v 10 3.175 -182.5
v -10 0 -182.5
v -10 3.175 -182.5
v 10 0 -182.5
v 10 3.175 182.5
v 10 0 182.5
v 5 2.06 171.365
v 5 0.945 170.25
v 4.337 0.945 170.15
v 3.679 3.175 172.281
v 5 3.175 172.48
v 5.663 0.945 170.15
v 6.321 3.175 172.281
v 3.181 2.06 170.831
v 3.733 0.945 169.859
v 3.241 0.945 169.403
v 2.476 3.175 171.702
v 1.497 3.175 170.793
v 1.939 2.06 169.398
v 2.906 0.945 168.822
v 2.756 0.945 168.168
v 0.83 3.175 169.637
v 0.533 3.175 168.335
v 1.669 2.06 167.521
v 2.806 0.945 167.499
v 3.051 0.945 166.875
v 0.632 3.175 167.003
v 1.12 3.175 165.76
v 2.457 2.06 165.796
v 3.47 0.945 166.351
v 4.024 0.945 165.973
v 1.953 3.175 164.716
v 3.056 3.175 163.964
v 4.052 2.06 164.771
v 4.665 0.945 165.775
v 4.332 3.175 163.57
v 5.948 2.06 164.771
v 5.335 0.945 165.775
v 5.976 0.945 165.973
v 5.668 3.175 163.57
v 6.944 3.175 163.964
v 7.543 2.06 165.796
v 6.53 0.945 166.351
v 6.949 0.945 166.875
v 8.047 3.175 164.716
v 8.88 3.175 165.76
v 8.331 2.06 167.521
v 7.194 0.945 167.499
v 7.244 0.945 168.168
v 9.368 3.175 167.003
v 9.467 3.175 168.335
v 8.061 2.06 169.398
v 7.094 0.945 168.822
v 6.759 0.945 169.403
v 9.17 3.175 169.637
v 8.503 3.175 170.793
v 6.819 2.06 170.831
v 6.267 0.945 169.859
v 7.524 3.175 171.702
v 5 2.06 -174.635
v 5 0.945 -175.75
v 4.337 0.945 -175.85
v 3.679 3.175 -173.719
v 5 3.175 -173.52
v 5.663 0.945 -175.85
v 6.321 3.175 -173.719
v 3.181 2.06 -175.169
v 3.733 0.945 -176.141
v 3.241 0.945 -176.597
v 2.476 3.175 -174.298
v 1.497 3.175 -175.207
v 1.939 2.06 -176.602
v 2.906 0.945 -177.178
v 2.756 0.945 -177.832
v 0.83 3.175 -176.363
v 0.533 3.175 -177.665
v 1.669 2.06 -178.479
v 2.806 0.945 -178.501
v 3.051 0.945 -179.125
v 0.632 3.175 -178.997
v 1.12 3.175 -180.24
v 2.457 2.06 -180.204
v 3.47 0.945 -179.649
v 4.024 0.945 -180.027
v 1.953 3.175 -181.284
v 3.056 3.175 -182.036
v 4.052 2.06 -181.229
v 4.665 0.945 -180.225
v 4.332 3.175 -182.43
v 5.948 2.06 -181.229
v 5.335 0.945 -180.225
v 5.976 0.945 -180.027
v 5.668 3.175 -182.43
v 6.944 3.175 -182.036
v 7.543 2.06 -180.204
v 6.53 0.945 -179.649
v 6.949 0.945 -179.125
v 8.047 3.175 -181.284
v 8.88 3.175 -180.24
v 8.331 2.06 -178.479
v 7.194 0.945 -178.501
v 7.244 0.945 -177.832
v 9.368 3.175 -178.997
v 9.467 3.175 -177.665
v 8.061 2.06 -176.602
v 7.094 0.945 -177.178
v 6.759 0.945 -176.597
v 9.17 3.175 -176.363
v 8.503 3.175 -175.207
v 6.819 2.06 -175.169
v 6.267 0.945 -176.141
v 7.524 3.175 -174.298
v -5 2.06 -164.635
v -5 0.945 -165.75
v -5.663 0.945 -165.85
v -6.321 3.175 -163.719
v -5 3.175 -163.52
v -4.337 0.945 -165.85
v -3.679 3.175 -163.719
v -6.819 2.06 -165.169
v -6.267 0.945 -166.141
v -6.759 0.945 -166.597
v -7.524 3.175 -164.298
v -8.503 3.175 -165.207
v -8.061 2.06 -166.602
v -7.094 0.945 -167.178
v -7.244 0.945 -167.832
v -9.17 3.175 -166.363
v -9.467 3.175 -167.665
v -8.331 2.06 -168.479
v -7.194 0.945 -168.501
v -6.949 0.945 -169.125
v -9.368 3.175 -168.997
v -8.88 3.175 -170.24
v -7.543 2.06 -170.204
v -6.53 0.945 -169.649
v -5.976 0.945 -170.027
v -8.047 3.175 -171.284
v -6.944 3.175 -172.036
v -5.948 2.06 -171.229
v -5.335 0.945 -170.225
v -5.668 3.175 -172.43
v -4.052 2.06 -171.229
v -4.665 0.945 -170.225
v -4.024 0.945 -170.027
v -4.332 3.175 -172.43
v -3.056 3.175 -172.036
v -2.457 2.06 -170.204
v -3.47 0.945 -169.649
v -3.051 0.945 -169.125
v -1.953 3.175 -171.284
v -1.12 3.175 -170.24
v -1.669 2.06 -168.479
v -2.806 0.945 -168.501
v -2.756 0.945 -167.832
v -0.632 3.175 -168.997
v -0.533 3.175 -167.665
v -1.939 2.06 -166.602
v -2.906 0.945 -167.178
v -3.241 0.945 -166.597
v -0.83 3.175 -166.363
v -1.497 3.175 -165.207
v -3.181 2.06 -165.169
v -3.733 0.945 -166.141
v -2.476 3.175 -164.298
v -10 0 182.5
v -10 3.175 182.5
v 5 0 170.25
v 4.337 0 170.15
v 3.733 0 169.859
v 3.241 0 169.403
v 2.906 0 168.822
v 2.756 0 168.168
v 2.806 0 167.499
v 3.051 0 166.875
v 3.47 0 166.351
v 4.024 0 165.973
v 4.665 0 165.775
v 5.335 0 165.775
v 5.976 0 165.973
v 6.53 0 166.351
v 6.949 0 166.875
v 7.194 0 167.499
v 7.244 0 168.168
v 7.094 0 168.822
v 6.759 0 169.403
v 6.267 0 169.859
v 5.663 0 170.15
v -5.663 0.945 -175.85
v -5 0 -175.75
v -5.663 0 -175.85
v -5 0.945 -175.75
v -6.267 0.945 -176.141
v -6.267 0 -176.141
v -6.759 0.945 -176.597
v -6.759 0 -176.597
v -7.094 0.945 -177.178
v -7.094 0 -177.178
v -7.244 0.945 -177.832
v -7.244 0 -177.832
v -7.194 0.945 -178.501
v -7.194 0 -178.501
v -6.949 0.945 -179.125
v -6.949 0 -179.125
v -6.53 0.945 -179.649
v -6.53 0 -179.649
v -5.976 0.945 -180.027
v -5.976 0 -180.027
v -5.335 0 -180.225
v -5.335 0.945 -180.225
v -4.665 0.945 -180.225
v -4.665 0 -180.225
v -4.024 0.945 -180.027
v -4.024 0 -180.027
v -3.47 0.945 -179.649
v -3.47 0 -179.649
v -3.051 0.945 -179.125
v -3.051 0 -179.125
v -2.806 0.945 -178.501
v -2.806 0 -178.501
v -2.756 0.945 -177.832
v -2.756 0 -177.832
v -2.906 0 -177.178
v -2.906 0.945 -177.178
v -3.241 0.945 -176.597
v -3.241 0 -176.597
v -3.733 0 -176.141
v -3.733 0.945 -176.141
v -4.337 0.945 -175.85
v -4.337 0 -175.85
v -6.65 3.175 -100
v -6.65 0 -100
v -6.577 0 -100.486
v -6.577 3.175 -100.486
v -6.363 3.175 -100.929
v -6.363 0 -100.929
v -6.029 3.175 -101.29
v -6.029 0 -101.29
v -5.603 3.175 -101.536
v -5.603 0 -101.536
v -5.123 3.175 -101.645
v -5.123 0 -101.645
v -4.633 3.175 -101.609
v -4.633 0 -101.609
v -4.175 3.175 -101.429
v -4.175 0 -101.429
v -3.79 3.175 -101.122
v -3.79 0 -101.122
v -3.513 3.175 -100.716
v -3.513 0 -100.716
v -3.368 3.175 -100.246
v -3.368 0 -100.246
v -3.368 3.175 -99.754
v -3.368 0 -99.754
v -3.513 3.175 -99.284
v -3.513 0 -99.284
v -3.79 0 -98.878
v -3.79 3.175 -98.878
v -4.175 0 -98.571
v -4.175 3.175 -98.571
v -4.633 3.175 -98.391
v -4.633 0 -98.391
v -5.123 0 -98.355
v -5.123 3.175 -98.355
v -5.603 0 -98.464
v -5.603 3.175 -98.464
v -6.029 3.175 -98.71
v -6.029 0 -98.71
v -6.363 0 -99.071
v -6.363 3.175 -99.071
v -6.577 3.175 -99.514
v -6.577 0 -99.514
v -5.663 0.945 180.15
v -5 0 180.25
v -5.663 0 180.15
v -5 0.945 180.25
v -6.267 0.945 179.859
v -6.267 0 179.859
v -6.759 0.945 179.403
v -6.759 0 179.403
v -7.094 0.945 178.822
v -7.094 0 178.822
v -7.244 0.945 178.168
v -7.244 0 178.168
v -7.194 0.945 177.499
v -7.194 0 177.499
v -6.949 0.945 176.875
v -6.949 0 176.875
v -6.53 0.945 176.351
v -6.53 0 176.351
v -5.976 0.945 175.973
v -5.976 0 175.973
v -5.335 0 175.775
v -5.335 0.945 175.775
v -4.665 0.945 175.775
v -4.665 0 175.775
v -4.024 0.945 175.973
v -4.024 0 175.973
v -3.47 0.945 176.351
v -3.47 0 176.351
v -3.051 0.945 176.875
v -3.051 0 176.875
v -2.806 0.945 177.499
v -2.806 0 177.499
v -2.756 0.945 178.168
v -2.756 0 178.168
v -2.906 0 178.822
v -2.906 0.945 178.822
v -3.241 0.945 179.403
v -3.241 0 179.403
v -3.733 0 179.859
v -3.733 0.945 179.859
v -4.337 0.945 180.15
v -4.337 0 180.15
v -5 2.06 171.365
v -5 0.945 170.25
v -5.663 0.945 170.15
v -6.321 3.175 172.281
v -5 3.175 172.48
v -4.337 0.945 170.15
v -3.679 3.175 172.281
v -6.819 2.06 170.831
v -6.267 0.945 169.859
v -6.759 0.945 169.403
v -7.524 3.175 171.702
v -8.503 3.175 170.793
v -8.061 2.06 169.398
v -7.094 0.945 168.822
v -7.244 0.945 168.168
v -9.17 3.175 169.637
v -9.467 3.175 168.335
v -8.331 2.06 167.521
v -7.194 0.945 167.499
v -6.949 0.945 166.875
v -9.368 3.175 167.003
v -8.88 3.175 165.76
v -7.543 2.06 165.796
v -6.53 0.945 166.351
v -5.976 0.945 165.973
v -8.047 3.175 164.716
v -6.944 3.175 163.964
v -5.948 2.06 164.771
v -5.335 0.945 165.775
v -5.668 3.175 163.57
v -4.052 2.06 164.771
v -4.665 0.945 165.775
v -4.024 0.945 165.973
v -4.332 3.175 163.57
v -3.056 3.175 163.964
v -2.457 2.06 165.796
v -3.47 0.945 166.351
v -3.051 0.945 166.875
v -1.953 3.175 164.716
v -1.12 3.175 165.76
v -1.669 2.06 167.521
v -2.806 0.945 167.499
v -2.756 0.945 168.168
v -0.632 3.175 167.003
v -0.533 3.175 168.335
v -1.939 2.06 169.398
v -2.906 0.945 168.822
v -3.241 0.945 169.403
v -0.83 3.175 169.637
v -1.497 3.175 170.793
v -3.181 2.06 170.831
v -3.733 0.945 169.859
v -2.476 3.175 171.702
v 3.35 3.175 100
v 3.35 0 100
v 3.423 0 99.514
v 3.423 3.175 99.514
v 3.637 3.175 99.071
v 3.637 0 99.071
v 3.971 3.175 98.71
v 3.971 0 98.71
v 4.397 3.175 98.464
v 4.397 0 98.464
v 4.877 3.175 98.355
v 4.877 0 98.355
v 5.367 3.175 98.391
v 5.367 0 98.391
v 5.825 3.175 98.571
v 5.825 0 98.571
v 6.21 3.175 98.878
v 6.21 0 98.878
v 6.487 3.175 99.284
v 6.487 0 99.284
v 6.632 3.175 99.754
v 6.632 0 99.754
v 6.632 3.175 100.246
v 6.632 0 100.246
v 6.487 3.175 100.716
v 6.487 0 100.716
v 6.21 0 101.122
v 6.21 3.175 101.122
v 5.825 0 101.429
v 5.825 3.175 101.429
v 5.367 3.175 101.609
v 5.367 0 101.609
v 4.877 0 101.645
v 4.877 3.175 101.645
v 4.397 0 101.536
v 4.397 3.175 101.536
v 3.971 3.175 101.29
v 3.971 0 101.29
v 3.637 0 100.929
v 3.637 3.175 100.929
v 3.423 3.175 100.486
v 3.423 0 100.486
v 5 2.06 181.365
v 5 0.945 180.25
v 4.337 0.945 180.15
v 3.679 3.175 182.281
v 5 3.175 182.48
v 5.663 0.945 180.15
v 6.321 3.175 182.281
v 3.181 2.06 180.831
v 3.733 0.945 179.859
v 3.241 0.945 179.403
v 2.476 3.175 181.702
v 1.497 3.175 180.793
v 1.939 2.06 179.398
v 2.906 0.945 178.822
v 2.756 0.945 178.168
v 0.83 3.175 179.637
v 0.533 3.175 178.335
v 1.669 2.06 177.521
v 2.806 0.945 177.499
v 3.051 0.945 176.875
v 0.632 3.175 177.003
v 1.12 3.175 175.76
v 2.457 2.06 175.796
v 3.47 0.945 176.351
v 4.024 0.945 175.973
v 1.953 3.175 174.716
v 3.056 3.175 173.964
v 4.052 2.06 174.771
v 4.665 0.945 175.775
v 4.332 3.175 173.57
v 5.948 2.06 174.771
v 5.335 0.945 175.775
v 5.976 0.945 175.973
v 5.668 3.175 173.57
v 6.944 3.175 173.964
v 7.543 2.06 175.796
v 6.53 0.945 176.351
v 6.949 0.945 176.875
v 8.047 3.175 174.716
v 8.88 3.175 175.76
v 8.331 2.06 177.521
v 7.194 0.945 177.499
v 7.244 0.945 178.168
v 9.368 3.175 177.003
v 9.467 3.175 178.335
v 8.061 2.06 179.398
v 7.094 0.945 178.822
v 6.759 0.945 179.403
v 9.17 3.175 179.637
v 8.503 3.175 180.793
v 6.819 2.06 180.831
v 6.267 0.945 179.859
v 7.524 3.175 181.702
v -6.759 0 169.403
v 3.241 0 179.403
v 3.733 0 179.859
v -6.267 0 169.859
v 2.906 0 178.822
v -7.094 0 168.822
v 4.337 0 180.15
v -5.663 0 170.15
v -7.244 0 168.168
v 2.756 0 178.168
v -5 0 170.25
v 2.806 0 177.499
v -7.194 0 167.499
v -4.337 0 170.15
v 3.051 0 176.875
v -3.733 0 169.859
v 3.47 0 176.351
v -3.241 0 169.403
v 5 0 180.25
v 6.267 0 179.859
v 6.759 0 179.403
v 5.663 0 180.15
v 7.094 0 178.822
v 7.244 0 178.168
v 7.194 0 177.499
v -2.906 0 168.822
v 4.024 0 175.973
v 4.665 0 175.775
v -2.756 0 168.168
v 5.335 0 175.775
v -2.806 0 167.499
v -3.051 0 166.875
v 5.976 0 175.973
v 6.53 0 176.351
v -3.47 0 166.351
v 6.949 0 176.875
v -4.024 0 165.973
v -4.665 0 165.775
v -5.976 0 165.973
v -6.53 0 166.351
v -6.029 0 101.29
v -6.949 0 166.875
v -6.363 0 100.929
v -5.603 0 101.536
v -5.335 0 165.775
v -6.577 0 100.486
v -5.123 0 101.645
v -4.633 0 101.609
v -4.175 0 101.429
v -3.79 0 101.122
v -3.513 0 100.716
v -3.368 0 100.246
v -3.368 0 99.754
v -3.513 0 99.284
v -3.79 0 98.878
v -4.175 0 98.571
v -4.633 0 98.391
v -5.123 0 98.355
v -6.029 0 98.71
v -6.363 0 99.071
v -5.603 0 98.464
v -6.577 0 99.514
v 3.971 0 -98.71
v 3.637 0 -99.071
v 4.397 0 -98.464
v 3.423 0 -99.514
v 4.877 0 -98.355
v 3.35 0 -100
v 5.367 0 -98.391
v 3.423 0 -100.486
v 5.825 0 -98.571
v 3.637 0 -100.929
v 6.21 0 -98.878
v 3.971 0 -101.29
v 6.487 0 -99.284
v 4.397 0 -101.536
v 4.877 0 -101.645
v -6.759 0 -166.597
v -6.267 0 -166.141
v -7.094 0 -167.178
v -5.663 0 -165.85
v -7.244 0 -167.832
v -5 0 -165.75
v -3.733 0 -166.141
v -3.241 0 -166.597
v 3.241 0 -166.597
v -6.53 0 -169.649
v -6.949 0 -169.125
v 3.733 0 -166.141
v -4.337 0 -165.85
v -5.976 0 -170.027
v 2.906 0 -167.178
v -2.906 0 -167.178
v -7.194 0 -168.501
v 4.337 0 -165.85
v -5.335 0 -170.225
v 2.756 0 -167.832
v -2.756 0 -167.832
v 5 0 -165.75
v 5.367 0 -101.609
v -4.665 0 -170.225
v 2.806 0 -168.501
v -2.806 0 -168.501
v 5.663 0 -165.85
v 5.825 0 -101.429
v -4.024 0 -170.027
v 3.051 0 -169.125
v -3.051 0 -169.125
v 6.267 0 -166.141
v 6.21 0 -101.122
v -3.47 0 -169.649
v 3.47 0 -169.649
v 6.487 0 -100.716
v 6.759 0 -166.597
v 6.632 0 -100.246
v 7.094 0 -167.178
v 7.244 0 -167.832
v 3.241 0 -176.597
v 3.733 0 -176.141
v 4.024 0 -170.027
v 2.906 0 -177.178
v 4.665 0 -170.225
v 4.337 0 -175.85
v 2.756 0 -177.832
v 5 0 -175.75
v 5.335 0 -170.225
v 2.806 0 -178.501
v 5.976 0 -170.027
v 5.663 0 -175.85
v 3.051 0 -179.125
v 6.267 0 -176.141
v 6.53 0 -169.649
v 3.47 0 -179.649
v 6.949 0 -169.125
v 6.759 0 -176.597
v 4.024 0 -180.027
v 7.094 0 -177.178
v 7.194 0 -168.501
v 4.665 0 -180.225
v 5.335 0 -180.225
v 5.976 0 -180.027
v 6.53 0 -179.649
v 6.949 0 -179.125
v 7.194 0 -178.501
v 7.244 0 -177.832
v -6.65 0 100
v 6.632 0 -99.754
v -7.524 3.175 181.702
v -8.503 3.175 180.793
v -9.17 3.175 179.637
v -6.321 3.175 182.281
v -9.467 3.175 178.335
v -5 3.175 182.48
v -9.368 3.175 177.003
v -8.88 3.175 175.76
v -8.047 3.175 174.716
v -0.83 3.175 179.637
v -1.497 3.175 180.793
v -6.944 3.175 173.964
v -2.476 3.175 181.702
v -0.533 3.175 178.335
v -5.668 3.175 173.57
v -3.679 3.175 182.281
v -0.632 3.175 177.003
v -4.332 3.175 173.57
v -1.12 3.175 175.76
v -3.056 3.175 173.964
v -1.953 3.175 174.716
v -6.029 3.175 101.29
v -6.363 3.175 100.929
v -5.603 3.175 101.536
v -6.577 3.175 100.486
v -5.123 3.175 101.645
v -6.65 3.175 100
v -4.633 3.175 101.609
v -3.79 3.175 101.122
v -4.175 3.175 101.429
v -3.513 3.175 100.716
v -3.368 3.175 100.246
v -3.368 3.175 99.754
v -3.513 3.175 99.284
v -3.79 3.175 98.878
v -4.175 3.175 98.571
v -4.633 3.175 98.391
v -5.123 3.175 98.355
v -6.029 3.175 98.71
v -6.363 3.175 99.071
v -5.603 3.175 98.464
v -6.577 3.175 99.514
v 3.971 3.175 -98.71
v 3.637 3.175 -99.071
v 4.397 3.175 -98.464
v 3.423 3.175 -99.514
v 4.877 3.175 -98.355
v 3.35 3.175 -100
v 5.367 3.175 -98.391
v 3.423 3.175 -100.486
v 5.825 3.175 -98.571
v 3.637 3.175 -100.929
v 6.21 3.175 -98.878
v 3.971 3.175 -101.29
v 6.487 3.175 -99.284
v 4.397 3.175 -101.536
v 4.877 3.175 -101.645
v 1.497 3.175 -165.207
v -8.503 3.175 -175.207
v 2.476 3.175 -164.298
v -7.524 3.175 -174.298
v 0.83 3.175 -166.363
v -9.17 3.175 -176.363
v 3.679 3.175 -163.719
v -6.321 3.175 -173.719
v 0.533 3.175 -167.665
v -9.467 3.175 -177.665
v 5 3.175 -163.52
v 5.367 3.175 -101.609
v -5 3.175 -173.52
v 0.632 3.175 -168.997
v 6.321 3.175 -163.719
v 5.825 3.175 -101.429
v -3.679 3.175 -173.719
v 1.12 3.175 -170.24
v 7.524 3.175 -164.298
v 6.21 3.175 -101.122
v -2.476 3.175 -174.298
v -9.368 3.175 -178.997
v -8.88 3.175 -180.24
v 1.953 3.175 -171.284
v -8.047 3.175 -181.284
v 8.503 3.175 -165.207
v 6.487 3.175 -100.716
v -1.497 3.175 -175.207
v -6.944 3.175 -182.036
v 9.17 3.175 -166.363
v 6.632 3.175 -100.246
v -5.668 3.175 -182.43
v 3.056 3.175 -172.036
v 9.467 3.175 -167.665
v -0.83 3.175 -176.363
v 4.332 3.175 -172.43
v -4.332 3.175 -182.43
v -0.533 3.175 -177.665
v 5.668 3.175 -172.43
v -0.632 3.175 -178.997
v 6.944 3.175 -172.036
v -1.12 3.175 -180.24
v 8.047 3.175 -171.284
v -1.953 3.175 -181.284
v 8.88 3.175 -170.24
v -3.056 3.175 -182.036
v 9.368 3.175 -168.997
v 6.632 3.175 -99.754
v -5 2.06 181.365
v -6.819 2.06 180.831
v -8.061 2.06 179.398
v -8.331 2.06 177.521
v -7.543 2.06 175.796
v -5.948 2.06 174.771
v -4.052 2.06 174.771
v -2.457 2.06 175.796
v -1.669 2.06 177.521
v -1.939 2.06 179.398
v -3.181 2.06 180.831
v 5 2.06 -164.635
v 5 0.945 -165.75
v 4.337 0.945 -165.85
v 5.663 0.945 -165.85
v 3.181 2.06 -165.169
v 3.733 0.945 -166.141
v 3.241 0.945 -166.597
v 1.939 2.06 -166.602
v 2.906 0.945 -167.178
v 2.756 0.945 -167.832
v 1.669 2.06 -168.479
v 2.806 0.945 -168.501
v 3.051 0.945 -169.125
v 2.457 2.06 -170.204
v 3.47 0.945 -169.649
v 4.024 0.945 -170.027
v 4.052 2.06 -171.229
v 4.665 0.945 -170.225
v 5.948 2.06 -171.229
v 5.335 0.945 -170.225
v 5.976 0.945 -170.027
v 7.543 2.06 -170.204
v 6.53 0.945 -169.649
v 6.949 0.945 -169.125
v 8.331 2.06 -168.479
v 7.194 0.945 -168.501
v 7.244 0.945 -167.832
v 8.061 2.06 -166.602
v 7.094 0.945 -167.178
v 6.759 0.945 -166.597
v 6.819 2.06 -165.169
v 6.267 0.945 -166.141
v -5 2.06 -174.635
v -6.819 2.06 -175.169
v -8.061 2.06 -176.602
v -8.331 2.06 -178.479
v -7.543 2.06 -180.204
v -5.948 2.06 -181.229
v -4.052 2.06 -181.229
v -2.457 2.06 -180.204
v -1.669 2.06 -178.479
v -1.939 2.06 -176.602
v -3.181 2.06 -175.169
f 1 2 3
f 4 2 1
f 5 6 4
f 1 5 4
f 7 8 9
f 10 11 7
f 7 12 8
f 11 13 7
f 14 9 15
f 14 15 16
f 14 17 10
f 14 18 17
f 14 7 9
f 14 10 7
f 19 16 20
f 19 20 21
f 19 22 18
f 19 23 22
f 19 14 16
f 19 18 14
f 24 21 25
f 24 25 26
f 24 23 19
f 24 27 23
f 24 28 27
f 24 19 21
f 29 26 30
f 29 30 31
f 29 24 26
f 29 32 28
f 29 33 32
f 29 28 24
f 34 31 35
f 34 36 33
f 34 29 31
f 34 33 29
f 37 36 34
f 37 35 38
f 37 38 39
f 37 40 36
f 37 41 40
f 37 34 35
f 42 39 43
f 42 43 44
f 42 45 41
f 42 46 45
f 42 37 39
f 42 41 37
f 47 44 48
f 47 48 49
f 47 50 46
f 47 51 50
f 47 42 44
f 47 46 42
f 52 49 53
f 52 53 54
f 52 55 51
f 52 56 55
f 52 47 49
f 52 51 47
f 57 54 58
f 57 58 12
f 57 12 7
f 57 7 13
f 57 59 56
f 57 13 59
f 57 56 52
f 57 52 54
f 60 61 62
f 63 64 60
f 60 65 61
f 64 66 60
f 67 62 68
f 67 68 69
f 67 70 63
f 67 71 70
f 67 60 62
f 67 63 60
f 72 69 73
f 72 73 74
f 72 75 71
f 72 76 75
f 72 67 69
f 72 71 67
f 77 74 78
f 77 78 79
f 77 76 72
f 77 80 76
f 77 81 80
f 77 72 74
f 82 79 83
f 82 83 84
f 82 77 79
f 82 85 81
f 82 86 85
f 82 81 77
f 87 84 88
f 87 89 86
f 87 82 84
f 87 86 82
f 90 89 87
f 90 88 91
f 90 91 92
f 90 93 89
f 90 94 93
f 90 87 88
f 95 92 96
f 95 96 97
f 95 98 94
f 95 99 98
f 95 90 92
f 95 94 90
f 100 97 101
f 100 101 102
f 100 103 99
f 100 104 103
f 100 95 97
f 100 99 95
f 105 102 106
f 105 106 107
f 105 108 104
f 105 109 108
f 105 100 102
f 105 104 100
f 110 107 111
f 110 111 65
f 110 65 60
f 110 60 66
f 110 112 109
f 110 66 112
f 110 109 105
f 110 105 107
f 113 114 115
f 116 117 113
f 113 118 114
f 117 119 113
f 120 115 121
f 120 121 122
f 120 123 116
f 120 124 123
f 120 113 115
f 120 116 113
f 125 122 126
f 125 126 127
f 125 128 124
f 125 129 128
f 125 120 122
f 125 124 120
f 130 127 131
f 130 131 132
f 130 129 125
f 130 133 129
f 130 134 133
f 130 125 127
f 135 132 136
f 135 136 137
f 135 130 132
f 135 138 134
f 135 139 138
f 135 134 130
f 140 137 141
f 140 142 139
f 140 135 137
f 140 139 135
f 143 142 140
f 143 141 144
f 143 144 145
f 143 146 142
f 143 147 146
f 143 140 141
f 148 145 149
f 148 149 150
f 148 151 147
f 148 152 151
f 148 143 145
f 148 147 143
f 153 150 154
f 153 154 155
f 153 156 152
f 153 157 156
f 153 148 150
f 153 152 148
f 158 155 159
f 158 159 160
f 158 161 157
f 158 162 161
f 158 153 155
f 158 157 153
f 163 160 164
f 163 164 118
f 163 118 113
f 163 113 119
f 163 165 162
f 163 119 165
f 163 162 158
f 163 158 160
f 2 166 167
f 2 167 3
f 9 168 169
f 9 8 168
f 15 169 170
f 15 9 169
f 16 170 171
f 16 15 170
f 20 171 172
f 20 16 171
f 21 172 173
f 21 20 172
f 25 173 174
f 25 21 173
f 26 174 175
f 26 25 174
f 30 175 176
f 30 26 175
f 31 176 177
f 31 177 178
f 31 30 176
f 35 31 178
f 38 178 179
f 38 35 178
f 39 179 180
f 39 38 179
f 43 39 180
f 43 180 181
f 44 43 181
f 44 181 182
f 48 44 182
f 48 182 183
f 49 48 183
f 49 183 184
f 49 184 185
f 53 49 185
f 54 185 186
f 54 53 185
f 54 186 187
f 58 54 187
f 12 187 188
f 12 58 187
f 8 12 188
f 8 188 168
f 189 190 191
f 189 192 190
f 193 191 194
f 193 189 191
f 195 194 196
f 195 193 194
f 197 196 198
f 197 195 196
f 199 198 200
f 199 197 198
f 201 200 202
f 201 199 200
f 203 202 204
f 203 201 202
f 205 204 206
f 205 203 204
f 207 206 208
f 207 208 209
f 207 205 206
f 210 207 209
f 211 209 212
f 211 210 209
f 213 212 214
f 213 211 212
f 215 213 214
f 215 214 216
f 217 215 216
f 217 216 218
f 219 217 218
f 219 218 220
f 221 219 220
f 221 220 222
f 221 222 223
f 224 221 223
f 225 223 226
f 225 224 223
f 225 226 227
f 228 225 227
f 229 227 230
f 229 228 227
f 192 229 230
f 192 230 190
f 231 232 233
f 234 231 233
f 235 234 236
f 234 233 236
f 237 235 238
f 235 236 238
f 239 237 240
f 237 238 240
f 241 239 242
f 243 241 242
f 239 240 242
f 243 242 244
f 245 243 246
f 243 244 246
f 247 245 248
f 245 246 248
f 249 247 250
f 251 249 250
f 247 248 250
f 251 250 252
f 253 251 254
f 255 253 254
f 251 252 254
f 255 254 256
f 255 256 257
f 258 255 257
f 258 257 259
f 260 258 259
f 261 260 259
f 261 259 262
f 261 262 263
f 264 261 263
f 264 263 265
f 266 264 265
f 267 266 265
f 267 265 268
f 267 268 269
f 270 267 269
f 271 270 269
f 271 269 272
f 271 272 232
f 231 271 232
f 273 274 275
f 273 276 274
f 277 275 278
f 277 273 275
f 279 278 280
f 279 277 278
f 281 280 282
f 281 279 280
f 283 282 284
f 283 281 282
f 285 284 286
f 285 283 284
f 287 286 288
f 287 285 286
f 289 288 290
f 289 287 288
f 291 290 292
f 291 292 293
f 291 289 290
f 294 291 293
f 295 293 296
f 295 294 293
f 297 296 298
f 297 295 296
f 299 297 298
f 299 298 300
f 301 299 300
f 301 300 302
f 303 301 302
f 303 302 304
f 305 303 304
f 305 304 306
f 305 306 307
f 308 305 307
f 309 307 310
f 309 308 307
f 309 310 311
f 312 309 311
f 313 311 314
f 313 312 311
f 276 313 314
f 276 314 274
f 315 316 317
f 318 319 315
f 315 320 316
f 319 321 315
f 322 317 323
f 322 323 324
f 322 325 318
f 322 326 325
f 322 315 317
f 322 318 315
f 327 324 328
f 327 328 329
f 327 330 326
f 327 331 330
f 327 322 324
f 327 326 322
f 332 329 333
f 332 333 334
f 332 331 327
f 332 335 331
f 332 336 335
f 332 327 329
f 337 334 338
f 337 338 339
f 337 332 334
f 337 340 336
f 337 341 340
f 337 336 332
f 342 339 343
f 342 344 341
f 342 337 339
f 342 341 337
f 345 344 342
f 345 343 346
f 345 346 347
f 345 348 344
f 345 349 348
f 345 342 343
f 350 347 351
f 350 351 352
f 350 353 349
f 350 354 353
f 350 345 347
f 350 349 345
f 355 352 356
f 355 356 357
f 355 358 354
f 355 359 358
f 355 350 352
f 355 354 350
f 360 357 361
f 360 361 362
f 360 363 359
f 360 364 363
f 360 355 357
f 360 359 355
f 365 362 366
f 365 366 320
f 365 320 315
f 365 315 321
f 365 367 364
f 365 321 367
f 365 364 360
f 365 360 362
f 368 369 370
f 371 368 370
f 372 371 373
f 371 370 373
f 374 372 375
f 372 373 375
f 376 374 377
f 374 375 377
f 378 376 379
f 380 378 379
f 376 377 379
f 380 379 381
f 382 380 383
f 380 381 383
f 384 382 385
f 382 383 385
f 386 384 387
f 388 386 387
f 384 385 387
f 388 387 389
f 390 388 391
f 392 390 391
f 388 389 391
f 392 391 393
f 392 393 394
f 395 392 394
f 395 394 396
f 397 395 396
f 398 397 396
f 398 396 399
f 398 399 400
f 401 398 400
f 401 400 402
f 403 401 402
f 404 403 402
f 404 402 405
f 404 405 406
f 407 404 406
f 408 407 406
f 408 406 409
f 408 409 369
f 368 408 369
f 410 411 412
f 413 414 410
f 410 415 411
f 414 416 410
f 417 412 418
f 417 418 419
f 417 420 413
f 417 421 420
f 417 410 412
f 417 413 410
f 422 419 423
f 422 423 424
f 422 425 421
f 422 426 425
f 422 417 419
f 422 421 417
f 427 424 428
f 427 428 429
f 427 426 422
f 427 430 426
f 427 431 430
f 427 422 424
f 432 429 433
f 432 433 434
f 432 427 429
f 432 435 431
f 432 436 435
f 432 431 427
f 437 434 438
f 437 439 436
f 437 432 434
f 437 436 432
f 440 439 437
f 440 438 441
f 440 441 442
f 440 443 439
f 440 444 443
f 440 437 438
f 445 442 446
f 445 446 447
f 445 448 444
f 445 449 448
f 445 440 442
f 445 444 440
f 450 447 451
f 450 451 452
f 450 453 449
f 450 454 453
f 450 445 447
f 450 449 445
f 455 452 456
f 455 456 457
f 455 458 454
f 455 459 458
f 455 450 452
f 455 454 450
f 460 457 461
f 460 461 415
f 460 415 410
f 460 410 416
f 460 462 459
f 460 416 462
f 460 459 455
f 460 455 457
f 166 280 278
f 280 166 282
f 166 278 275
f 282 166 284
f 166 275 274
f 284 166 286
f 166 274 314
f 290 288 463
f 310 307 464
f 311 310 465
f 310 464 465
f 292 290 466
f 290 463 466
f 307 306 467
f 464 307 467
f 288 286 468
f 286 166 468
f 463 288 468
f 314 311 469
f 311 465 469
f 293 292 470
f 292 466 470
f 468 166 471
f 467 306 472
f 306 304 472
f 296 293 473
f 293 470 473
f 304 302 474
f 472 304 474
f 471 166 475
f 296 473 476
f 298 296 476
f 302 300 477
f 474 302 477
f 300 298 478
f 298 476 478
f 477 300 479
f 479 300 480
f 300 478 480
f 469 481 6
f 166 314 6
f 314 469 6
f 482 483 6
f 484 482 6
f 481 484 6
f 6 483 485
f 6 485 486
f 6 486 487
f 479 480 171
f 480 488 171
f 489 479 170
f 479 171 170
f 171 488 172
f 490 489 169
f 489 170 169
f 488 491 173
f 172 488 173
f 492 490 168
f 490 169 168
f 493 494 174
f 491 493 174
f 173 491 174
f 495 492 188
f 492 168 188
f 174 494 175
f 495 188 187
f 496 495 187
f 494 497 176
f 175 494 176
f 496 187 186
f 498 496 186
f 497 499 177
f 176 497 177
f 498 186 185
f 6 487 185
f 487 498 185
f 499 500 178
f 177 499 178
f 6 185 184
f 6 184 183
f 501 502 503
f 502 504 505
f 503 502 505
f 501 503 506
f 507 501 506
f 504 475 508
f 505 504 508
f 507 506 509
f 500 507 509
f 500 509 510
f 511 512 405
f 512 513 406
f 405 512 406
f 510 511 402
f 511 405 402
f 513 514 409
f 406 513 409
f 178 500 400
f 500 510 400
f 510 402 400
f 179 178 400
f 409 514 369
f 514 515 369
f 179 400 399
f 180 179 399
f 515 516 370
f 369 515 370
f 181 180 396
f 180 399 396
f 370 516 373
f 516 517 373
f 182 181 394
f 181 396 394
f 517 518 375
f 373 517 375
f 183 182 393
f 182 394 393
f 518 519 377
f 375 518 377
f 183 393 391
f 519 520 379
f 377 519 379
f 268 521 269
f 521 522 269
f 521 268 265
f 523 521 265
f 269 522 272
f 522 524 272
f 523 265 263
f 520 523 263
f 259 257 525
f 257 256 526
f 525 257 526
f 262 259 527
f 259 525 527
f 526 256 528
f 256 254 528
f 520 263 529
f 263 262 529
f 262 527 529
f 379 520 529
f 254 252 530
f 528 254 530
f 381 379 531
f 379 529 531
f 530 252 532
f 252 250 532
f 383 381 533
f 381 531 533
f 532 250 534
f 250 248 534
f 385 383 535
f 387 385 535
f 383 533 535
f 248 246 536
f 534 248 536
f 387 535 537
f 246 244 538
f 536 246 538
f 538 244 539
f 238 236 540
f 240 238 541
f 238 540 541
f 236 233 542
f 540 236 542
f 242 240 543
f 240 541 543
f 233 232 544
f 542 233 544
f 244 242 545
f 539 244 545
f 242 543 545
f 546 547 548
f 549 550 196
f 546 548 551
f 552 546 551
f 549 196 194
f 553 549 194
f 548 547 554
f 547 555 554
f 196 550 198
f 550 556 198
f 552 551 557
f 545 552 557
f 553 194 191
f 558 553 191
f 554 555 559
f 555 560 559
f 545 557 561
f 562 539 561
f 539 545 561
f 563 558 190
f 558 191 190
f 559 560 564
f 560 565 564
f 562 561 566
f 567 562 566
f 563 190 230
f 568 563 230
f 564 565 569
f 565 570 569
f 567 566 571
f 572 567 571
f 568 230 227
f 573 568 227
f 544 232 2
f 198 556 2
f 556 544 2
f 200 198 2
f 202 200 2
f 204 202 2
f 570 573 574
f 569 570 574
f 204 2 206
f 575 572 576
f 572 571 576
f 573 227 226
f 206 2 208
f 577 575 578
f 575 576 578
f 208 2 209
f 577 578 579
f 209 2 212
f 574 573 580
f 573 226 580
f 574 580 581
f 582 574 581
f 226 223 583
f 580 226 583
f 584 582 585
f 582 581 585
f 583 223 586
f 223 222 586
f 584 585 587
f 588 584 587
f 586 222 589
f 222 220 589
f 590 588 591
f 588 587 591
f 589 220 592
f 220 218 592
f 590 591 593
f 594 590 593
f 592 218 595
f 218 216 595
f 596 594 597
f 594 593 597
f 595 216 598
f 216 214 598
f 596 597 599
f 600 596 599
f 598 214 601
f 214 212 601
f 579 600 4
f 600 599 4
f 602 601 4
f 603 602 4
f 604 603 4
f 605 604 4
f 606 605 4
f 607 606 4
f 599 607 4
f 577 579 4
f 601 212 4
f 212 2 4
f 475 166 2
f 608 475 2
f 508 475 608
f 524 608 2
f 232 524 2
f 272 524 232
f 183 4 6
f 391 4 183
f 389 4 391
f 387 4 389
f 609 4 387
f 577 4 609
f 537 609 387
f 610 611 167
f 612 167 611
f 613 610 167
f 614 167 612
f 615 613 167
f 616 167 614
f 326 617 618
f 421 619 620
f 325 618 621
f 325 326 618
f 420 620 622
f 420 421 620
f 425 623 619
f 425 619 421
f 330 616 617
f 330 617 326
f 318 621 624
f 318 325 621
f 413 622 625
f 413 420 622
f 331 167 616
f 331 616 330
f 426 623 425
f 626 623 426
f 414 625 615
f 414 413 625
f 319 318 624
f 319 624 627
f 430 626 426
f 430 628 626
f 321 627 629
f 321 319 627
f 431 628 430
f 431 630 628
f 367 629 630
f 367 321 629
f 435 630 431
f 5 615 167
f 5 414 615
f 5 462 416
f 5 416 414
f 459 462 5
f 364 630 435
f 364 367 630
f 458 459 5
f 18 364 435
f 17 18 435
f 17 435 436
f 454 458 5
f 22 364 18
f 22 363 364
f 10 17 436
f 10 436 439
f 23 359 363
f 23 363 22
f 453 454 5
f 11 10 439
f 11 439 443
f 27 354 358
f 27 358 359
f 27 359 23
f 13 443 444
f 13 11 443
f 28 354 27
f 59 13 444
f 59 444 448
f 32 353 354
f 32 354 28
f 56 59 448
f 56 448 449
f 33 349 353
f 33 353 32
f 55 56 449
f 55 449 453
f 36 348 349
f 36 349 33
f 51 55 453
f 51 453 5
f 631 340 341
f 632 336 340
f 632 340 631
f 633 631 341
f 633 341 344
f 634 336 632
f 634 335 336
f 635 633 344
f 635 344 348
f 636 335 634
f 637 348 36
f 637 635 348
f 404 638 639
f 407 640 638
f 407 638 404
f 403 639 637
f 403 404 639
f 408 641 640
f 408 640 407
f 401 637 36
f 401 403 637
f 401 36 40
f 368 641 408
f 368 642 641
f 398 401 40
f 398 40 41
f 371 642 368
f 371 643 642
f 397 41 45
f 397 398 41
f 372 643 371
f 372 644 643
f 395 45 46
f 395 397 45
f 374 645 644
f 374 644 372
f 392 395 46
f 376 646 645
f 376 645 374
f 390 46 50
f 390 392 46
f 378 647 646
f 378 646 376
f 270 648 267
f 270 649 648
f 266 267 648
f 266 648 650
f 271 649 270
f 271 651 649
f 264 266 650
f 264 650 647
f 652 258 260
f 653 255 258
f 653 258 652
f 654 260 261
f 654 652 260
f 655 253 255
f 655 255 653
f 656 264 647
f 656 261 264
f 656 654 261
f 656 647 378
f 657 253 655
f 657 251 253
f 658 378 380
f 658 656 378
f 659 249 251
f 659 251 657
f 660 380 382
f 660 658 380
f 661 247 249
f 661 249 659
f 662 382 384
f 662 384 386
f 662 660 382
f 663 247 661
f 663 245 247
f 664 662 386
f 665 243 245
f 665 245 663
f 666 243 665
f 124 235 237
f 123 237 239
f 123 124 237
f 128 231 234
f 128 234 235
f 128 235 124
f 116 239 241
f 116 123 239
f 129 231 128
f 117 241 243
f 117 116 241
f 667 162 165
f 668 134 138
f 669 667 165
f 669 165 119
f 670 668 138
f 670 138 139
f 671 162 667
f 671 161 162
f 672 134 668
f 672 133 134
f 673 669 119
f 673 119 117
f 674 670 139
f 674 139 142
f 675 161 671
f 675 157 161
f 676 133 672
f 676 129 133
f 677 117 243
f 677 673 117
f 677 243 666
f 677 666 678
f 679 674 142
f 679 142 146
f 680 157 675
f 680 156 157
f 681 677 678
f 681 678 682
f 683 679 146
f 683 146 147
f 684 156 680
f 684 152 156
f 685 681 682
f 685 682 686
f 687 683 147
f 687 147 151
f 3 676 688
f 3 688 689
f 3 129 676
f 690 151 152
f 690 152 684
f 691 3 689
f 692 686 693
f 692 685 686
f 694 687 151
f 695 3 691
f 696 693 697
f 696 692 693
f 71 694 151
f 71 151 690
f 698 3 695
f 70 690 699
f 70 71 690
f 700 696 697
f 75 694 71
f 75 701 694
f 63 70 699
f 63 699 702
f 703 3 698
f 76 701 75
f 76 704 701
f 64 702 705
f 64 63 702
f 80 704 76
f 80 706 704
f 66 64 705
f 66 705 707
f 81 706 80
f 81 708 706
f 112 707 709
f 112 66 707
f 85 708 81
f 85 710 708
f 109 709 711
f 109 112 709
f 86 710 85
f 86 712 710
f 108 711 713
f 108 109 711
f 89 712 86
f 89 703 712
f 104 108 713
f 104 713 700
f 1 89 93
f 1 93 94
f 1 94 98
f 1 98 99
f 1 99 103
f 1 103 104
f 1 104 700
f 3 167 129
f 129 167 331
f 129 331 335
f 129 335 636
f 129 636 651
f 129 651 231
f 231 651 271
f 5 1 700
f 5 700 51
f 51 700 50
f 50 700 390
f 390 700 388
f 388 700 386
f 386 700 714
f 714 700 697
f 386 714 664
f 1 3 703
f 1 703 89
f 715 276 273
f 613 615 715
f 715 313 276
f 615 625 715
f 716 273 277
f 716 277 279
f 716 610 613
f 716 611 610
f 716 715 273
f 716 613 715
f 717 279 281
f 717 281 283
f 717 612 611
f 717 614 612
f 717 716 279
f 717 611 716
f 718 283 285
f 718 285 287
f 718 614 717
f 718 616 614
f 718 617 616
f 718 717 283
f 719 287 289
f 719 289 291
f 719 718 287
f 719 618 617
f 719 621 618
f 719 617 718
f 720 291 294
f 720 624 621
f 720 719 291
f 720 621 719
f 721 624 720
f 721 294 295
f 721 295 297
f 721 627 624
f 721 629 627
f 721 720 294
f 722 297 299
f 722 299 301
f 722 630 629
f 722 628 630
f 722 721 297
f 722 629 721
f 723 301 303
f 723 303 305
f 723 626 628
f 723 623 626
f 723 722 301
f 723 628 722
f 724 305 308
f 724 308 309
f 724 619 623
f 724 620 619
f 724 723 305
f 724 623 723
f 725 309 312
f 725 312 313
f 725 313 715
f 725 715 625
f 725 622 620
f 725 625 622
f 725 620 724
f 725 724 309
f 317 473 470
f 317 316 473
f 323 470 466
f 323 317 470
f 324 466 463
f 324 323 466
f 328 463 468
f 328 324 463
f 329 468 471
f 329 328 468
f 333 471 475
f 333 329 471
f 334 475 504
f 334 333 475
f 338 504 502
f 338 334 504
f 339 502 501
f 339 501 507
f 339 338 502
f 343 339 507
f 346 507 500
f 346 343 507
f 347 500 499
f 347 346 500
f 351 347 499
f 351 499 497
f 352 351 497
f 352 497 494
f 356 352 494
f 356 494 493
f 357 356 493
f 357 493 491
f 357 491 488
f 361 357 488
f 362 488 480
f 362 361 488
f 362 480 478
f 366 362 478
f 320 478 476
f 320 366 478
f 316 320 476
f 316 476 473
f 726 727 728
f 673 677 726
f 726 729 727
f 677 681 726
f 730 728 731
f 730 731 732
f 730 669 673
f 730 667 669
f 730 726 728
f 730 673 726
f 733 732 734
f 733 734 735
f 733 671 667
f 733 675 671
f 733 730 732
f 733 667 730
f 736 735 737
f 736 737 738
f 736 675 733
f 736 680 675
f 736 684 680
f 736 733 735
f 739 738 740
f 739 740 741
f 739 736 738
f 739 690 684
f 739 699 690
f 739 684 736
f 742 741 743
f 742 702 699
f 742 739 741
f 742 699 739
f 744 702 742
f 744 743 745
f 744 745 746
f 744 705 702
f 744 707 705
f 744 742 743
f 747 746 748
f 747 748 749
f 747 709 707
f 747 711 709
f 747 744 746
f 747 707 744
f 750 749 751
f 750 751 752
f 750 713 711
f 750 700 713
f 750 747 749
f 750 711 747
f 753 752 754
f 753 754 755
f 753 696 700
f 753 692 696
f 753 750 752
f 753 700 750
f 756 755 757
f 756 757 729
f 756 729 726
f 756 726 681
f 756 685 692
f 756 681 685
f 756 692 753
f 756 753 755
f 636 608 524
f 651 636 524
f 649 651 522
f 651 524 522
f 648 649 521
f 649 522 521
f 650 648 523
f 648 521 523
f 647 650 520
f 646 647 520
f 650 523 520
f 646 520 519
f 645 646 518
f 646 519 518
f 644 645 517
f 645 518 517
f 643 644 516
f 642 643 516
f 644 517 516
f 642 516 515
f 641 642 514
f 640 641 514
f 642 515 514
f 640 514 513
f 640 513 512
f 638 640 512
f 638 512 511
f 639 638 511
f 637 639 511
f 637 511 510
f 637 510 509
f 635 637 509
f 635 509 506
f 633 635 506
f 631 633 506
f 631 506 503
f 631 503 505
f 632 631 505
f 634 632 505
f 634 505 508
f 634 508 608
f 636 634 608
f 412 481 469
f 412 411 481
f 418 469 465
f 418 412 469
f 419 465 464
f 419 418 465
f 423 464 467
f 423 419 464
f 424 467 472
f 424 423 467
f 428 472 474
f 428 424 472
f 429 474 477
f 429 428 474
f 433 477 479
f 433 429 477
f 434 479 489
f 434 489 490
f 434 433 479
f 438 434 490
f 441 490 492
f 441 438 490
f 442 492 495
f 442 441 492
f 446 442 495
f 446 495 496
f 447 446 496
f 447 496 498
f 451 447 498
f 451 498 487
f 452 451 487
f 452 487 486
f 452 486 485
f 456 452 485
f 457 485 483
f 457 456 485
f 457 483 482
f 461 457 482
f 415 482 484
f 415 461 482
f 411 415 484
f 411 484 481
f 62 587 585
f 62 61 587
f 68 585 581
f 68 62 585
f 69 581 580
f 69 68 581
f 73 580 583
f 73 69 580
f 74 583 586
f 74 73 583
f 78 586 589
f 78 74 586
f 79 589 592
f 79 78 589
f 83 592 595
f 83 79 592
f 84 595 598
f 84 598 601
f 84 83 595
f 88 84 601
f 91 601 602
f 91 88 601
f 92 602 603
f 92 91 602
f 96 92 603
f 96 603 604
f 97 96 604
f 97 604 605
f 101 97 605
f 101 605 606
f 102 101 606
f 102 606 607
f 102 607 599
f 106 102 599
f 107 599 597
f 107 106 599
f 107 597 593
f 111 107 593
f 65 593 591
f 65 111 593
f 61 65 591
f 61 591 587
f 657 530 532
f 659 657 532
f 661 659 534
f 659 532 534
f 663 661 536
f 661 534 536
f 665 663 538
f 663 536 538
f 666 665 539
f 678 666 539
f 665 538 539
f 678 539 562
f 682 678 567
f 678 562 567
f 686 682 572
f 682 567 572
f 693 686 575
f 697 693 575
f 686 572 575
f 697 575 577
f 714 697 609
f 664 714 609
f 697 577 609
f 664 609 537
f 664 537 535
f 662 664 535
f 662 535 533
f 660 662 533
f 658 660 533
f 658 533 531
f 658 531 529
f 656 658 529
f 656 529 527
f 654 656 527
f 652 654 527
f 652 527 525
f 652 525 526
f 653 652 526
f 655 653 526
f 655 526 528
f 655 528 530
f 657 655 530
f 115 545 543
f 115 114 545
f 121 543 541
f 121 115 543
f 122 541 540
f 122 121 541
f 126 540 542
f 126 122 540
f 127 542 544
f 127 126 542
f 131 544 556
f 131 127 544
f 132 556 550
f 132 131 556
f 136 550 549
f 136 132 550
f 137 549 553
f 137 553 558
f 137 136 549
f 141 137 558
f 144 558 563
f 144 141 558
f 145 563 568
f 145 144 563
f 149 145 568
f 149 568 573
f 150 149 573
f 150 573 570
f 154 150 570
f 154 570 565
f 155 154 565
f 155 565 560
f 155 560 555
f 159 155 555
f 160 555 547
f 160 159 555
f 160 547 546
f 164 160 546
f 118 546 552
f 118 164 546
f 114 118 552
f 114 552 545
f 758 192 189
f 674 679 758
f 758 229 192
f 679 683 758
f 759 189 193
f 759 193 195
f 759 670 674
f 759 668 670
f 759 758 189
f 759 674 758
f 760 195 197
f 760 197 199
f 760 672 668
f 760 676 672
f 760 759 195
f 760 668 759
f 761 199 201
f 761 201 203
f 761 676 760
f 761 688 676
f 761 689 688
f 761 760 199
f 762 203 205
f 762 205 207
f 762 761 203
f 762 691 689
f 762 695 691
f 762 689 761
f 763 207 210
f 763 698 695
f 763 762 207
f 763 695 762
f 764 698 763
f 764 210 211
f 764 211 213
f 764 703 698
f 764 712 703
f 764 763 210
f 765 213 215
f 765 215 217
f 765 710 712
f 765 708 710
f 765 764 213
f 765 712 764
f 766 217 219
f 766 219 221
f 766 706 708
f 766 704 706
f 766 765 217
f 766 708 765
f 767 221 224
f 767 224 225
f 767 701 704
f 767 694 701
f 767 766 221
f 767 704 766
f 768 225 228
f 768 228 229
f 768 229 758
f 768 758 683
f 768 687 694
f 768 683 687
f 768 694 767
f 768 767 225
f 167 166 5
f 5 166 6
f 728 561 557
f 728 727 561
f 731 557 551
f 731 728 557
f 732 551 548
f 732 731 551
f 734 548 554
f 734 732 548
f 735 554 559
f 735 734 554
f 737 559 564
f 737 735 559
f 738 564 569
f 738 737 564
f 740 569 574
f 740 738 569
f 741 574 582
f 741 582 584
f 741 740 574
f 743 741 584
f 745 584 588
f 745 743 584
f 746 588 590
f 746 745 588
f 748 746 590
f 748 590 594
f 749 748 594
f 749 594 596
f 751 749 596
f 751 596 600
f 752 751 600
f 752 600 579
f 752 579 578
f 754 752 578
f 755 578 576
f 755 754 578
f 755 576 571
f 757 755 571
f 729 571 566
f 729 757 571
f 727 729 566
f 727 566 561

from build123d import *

# Parameters (mm, degrees)
SKETCH1_W                    = 20
SKETCH1_H                    = 365
BOSS_EXTRUDE1_DEPTH          = 3.175
CSK_FOR_M4_SFHCS1_AT_2_COUNT = 2
CSK_FOR_M4_SFHCS1_AT_2_PITCH = 14.142135624
CSK_FOR_M4_SFHCS1_AT_3_COUNT = 2
CSK_FOR_M4_SFHCS1_AT_3_PITCH = 10
CSK_FOR_M4_SFHCS1_AT_4_COUNT = 2
CSK_FOR_M4_SFHCS1_AT_4_PITCH = 10
CSK_FOR_M4_SFHCS1_AT_5_COUNT = 2
CSK_FOR_M4_SFHCS1_AT_5_PITCH = 346
CSK_FOR_M4_SFHCS1_AT_6_COUNT = 2
CSK_FOR_M4_SFHCS1_AT_6_PITCH = 336.148776586
CSK_FOR_M4_SFHCS1_AT_7_COUNT = 2
CSK_FOR_M4_SFHCS1_AT_7_PITCH = 346.144478506
CSK_FOR_M4_SFHCS1_AT_8_COUNT = 2
CSK_FOR_M4_SFHCS1_AT_8_PITCH = 336
M4X0_7_TAPPED_HOLE1_D        = 3.3


with BuildPart() as part:
    # Sketch1 → Boss-Extrude1 (new body)
    with BuildSketch(Plane(origin=(0, 0, 0), x_dir=(1, 0, 0), z_dir=(0, 1, 0))):
        Rectangle(SKETCH1_W, SKETCH1_H)
    extrude(amount=BOSS_EXTRUDE1_DEPTH)

    # Sketch3 → CSK for M4 SFHCS1 (revolve, cut)
    with BuildSketch(Plane(origin=(5, 3.175, 168), x_dir=(0, 0, 1), z_dir=(1, 0, 0))):
        Polygon((0, 0), (0, 3.175), (2.25, 3.175), (2.25, 2.23), (4.48, 0), align=None)
    csk_for_m4_sfhcs1 = revolve(axis=Axis((5, 9.525, 168), (0, -1, 0)), mode=Mode.SUBTRACT)

    # CSK for M4 SFHCS1 at 2: CSK for M4 SFHCS1 ×2
    with Locations(*[Vector(-0.7071067811865469, 0, 0.7071067811865482) * (i * CSK_FOR_M4_SFHCS1_AT_2_PITCH) for i in range(1, CSK_FOR_M4_SFHCS1_AT_2_COUNT)]):
        add(csk_for_m4_sfhcs1, mode=Mode.SUBTRACT)

    # CSK for M4 SFHCS1 at 3: CSK for M4 SFHCS1 ×2
    with Locations(*[(-i * CSK_FOR_M4_SFHCS1_AT_3_PITCH, 0, 0) for i in range(1, CSK_FOR_M4_SFHCS1_AT_3_COUNT)]):
        add(csk_for_m4_sfhcs1, mode=Mode.SUBTRACT)

    # CSK for M4 SFHCS1 at 4: CSK for M4 SFHCS1 ×2
    with Locations(*[(0, 0, i * CSK_FOR_M4_SFHCS1_AT_4_PITCH) for i in range(1, CSK_FOR_M4_SFHCS1_AT_4_COUNT)]):
        add(csk_for_m4_sfhcs1, mode=Mode.SUBTRACT)

    # CSK for M4 SFHCS1 at 5: CSK for M4 SFHCS1 ×2
    with Locations(*[(0, 0, -i * CSK_FOR_M4_SFHCS1_AT_5_PITCH) for i in range(1, CSK_FOR_M4_SFHCS1_AT_5_COUNT)]):
        add(csk_for_m4_sfhcs1, mode=Mode.SUBTRACT)

    # CSK for M4 SFHCS1 at 6: CSK for M4 SFHCS1 ×2
    with Locations(*[Vector(-0.029748732396333223, 0, -0.9995574085167952) * (i * CSK_FOR_M4_SFHCS1_AT_6_PITCH) for i in range(1, CSK_FOR_M4_SFHCS1_AT_6_COUNT)]):
        add(csk_for_m4_sfhcs1, mode=Mode.SUBTRACT)

    # CSK for M4 SFHCS1 at 7: CSK for M4 SFHCS1 ×2
    with Locations(*[Vector(-0.028889670703889703, 0, -0.9995826063545828) * (i * CSK_FOR_M4_SFHCS1_AT_7_PITCH) for i in range(1, CSK_FOR_M4_SFHCS1_AT_7_COUNT)]):
        add(csk_for_m4_sfhcs1, mode=Mode.SUBTRACT)

    # CSK for M4 SFHCS1 at 8: CSK for M4 SFHCS1 ×2
    with Locations(*[(0, 0, -i * CSK_FOR_M4_SFHCS1_AT_8_PITCH) for i in range(1, CSK_FOR_M4_SFHCS1_AT_8_COUNT)]):
        add(csk_for_m4_sfhcs1, mode=Mode.SUBTRACT)

    # M4x0.7 Tapped Hole1 (through all)
    with Locations(Plane(origin=(0, 3.175, 0), x_dir=(1, 0, 0), z_dir=(0, 1, 0))):
        with Locations((-5, -100), (-5, 100), (5, 100), (5, -100)):
            Hole(M4X0_7_TAPPED_HOLE1_D / 2)


solid = part.part
